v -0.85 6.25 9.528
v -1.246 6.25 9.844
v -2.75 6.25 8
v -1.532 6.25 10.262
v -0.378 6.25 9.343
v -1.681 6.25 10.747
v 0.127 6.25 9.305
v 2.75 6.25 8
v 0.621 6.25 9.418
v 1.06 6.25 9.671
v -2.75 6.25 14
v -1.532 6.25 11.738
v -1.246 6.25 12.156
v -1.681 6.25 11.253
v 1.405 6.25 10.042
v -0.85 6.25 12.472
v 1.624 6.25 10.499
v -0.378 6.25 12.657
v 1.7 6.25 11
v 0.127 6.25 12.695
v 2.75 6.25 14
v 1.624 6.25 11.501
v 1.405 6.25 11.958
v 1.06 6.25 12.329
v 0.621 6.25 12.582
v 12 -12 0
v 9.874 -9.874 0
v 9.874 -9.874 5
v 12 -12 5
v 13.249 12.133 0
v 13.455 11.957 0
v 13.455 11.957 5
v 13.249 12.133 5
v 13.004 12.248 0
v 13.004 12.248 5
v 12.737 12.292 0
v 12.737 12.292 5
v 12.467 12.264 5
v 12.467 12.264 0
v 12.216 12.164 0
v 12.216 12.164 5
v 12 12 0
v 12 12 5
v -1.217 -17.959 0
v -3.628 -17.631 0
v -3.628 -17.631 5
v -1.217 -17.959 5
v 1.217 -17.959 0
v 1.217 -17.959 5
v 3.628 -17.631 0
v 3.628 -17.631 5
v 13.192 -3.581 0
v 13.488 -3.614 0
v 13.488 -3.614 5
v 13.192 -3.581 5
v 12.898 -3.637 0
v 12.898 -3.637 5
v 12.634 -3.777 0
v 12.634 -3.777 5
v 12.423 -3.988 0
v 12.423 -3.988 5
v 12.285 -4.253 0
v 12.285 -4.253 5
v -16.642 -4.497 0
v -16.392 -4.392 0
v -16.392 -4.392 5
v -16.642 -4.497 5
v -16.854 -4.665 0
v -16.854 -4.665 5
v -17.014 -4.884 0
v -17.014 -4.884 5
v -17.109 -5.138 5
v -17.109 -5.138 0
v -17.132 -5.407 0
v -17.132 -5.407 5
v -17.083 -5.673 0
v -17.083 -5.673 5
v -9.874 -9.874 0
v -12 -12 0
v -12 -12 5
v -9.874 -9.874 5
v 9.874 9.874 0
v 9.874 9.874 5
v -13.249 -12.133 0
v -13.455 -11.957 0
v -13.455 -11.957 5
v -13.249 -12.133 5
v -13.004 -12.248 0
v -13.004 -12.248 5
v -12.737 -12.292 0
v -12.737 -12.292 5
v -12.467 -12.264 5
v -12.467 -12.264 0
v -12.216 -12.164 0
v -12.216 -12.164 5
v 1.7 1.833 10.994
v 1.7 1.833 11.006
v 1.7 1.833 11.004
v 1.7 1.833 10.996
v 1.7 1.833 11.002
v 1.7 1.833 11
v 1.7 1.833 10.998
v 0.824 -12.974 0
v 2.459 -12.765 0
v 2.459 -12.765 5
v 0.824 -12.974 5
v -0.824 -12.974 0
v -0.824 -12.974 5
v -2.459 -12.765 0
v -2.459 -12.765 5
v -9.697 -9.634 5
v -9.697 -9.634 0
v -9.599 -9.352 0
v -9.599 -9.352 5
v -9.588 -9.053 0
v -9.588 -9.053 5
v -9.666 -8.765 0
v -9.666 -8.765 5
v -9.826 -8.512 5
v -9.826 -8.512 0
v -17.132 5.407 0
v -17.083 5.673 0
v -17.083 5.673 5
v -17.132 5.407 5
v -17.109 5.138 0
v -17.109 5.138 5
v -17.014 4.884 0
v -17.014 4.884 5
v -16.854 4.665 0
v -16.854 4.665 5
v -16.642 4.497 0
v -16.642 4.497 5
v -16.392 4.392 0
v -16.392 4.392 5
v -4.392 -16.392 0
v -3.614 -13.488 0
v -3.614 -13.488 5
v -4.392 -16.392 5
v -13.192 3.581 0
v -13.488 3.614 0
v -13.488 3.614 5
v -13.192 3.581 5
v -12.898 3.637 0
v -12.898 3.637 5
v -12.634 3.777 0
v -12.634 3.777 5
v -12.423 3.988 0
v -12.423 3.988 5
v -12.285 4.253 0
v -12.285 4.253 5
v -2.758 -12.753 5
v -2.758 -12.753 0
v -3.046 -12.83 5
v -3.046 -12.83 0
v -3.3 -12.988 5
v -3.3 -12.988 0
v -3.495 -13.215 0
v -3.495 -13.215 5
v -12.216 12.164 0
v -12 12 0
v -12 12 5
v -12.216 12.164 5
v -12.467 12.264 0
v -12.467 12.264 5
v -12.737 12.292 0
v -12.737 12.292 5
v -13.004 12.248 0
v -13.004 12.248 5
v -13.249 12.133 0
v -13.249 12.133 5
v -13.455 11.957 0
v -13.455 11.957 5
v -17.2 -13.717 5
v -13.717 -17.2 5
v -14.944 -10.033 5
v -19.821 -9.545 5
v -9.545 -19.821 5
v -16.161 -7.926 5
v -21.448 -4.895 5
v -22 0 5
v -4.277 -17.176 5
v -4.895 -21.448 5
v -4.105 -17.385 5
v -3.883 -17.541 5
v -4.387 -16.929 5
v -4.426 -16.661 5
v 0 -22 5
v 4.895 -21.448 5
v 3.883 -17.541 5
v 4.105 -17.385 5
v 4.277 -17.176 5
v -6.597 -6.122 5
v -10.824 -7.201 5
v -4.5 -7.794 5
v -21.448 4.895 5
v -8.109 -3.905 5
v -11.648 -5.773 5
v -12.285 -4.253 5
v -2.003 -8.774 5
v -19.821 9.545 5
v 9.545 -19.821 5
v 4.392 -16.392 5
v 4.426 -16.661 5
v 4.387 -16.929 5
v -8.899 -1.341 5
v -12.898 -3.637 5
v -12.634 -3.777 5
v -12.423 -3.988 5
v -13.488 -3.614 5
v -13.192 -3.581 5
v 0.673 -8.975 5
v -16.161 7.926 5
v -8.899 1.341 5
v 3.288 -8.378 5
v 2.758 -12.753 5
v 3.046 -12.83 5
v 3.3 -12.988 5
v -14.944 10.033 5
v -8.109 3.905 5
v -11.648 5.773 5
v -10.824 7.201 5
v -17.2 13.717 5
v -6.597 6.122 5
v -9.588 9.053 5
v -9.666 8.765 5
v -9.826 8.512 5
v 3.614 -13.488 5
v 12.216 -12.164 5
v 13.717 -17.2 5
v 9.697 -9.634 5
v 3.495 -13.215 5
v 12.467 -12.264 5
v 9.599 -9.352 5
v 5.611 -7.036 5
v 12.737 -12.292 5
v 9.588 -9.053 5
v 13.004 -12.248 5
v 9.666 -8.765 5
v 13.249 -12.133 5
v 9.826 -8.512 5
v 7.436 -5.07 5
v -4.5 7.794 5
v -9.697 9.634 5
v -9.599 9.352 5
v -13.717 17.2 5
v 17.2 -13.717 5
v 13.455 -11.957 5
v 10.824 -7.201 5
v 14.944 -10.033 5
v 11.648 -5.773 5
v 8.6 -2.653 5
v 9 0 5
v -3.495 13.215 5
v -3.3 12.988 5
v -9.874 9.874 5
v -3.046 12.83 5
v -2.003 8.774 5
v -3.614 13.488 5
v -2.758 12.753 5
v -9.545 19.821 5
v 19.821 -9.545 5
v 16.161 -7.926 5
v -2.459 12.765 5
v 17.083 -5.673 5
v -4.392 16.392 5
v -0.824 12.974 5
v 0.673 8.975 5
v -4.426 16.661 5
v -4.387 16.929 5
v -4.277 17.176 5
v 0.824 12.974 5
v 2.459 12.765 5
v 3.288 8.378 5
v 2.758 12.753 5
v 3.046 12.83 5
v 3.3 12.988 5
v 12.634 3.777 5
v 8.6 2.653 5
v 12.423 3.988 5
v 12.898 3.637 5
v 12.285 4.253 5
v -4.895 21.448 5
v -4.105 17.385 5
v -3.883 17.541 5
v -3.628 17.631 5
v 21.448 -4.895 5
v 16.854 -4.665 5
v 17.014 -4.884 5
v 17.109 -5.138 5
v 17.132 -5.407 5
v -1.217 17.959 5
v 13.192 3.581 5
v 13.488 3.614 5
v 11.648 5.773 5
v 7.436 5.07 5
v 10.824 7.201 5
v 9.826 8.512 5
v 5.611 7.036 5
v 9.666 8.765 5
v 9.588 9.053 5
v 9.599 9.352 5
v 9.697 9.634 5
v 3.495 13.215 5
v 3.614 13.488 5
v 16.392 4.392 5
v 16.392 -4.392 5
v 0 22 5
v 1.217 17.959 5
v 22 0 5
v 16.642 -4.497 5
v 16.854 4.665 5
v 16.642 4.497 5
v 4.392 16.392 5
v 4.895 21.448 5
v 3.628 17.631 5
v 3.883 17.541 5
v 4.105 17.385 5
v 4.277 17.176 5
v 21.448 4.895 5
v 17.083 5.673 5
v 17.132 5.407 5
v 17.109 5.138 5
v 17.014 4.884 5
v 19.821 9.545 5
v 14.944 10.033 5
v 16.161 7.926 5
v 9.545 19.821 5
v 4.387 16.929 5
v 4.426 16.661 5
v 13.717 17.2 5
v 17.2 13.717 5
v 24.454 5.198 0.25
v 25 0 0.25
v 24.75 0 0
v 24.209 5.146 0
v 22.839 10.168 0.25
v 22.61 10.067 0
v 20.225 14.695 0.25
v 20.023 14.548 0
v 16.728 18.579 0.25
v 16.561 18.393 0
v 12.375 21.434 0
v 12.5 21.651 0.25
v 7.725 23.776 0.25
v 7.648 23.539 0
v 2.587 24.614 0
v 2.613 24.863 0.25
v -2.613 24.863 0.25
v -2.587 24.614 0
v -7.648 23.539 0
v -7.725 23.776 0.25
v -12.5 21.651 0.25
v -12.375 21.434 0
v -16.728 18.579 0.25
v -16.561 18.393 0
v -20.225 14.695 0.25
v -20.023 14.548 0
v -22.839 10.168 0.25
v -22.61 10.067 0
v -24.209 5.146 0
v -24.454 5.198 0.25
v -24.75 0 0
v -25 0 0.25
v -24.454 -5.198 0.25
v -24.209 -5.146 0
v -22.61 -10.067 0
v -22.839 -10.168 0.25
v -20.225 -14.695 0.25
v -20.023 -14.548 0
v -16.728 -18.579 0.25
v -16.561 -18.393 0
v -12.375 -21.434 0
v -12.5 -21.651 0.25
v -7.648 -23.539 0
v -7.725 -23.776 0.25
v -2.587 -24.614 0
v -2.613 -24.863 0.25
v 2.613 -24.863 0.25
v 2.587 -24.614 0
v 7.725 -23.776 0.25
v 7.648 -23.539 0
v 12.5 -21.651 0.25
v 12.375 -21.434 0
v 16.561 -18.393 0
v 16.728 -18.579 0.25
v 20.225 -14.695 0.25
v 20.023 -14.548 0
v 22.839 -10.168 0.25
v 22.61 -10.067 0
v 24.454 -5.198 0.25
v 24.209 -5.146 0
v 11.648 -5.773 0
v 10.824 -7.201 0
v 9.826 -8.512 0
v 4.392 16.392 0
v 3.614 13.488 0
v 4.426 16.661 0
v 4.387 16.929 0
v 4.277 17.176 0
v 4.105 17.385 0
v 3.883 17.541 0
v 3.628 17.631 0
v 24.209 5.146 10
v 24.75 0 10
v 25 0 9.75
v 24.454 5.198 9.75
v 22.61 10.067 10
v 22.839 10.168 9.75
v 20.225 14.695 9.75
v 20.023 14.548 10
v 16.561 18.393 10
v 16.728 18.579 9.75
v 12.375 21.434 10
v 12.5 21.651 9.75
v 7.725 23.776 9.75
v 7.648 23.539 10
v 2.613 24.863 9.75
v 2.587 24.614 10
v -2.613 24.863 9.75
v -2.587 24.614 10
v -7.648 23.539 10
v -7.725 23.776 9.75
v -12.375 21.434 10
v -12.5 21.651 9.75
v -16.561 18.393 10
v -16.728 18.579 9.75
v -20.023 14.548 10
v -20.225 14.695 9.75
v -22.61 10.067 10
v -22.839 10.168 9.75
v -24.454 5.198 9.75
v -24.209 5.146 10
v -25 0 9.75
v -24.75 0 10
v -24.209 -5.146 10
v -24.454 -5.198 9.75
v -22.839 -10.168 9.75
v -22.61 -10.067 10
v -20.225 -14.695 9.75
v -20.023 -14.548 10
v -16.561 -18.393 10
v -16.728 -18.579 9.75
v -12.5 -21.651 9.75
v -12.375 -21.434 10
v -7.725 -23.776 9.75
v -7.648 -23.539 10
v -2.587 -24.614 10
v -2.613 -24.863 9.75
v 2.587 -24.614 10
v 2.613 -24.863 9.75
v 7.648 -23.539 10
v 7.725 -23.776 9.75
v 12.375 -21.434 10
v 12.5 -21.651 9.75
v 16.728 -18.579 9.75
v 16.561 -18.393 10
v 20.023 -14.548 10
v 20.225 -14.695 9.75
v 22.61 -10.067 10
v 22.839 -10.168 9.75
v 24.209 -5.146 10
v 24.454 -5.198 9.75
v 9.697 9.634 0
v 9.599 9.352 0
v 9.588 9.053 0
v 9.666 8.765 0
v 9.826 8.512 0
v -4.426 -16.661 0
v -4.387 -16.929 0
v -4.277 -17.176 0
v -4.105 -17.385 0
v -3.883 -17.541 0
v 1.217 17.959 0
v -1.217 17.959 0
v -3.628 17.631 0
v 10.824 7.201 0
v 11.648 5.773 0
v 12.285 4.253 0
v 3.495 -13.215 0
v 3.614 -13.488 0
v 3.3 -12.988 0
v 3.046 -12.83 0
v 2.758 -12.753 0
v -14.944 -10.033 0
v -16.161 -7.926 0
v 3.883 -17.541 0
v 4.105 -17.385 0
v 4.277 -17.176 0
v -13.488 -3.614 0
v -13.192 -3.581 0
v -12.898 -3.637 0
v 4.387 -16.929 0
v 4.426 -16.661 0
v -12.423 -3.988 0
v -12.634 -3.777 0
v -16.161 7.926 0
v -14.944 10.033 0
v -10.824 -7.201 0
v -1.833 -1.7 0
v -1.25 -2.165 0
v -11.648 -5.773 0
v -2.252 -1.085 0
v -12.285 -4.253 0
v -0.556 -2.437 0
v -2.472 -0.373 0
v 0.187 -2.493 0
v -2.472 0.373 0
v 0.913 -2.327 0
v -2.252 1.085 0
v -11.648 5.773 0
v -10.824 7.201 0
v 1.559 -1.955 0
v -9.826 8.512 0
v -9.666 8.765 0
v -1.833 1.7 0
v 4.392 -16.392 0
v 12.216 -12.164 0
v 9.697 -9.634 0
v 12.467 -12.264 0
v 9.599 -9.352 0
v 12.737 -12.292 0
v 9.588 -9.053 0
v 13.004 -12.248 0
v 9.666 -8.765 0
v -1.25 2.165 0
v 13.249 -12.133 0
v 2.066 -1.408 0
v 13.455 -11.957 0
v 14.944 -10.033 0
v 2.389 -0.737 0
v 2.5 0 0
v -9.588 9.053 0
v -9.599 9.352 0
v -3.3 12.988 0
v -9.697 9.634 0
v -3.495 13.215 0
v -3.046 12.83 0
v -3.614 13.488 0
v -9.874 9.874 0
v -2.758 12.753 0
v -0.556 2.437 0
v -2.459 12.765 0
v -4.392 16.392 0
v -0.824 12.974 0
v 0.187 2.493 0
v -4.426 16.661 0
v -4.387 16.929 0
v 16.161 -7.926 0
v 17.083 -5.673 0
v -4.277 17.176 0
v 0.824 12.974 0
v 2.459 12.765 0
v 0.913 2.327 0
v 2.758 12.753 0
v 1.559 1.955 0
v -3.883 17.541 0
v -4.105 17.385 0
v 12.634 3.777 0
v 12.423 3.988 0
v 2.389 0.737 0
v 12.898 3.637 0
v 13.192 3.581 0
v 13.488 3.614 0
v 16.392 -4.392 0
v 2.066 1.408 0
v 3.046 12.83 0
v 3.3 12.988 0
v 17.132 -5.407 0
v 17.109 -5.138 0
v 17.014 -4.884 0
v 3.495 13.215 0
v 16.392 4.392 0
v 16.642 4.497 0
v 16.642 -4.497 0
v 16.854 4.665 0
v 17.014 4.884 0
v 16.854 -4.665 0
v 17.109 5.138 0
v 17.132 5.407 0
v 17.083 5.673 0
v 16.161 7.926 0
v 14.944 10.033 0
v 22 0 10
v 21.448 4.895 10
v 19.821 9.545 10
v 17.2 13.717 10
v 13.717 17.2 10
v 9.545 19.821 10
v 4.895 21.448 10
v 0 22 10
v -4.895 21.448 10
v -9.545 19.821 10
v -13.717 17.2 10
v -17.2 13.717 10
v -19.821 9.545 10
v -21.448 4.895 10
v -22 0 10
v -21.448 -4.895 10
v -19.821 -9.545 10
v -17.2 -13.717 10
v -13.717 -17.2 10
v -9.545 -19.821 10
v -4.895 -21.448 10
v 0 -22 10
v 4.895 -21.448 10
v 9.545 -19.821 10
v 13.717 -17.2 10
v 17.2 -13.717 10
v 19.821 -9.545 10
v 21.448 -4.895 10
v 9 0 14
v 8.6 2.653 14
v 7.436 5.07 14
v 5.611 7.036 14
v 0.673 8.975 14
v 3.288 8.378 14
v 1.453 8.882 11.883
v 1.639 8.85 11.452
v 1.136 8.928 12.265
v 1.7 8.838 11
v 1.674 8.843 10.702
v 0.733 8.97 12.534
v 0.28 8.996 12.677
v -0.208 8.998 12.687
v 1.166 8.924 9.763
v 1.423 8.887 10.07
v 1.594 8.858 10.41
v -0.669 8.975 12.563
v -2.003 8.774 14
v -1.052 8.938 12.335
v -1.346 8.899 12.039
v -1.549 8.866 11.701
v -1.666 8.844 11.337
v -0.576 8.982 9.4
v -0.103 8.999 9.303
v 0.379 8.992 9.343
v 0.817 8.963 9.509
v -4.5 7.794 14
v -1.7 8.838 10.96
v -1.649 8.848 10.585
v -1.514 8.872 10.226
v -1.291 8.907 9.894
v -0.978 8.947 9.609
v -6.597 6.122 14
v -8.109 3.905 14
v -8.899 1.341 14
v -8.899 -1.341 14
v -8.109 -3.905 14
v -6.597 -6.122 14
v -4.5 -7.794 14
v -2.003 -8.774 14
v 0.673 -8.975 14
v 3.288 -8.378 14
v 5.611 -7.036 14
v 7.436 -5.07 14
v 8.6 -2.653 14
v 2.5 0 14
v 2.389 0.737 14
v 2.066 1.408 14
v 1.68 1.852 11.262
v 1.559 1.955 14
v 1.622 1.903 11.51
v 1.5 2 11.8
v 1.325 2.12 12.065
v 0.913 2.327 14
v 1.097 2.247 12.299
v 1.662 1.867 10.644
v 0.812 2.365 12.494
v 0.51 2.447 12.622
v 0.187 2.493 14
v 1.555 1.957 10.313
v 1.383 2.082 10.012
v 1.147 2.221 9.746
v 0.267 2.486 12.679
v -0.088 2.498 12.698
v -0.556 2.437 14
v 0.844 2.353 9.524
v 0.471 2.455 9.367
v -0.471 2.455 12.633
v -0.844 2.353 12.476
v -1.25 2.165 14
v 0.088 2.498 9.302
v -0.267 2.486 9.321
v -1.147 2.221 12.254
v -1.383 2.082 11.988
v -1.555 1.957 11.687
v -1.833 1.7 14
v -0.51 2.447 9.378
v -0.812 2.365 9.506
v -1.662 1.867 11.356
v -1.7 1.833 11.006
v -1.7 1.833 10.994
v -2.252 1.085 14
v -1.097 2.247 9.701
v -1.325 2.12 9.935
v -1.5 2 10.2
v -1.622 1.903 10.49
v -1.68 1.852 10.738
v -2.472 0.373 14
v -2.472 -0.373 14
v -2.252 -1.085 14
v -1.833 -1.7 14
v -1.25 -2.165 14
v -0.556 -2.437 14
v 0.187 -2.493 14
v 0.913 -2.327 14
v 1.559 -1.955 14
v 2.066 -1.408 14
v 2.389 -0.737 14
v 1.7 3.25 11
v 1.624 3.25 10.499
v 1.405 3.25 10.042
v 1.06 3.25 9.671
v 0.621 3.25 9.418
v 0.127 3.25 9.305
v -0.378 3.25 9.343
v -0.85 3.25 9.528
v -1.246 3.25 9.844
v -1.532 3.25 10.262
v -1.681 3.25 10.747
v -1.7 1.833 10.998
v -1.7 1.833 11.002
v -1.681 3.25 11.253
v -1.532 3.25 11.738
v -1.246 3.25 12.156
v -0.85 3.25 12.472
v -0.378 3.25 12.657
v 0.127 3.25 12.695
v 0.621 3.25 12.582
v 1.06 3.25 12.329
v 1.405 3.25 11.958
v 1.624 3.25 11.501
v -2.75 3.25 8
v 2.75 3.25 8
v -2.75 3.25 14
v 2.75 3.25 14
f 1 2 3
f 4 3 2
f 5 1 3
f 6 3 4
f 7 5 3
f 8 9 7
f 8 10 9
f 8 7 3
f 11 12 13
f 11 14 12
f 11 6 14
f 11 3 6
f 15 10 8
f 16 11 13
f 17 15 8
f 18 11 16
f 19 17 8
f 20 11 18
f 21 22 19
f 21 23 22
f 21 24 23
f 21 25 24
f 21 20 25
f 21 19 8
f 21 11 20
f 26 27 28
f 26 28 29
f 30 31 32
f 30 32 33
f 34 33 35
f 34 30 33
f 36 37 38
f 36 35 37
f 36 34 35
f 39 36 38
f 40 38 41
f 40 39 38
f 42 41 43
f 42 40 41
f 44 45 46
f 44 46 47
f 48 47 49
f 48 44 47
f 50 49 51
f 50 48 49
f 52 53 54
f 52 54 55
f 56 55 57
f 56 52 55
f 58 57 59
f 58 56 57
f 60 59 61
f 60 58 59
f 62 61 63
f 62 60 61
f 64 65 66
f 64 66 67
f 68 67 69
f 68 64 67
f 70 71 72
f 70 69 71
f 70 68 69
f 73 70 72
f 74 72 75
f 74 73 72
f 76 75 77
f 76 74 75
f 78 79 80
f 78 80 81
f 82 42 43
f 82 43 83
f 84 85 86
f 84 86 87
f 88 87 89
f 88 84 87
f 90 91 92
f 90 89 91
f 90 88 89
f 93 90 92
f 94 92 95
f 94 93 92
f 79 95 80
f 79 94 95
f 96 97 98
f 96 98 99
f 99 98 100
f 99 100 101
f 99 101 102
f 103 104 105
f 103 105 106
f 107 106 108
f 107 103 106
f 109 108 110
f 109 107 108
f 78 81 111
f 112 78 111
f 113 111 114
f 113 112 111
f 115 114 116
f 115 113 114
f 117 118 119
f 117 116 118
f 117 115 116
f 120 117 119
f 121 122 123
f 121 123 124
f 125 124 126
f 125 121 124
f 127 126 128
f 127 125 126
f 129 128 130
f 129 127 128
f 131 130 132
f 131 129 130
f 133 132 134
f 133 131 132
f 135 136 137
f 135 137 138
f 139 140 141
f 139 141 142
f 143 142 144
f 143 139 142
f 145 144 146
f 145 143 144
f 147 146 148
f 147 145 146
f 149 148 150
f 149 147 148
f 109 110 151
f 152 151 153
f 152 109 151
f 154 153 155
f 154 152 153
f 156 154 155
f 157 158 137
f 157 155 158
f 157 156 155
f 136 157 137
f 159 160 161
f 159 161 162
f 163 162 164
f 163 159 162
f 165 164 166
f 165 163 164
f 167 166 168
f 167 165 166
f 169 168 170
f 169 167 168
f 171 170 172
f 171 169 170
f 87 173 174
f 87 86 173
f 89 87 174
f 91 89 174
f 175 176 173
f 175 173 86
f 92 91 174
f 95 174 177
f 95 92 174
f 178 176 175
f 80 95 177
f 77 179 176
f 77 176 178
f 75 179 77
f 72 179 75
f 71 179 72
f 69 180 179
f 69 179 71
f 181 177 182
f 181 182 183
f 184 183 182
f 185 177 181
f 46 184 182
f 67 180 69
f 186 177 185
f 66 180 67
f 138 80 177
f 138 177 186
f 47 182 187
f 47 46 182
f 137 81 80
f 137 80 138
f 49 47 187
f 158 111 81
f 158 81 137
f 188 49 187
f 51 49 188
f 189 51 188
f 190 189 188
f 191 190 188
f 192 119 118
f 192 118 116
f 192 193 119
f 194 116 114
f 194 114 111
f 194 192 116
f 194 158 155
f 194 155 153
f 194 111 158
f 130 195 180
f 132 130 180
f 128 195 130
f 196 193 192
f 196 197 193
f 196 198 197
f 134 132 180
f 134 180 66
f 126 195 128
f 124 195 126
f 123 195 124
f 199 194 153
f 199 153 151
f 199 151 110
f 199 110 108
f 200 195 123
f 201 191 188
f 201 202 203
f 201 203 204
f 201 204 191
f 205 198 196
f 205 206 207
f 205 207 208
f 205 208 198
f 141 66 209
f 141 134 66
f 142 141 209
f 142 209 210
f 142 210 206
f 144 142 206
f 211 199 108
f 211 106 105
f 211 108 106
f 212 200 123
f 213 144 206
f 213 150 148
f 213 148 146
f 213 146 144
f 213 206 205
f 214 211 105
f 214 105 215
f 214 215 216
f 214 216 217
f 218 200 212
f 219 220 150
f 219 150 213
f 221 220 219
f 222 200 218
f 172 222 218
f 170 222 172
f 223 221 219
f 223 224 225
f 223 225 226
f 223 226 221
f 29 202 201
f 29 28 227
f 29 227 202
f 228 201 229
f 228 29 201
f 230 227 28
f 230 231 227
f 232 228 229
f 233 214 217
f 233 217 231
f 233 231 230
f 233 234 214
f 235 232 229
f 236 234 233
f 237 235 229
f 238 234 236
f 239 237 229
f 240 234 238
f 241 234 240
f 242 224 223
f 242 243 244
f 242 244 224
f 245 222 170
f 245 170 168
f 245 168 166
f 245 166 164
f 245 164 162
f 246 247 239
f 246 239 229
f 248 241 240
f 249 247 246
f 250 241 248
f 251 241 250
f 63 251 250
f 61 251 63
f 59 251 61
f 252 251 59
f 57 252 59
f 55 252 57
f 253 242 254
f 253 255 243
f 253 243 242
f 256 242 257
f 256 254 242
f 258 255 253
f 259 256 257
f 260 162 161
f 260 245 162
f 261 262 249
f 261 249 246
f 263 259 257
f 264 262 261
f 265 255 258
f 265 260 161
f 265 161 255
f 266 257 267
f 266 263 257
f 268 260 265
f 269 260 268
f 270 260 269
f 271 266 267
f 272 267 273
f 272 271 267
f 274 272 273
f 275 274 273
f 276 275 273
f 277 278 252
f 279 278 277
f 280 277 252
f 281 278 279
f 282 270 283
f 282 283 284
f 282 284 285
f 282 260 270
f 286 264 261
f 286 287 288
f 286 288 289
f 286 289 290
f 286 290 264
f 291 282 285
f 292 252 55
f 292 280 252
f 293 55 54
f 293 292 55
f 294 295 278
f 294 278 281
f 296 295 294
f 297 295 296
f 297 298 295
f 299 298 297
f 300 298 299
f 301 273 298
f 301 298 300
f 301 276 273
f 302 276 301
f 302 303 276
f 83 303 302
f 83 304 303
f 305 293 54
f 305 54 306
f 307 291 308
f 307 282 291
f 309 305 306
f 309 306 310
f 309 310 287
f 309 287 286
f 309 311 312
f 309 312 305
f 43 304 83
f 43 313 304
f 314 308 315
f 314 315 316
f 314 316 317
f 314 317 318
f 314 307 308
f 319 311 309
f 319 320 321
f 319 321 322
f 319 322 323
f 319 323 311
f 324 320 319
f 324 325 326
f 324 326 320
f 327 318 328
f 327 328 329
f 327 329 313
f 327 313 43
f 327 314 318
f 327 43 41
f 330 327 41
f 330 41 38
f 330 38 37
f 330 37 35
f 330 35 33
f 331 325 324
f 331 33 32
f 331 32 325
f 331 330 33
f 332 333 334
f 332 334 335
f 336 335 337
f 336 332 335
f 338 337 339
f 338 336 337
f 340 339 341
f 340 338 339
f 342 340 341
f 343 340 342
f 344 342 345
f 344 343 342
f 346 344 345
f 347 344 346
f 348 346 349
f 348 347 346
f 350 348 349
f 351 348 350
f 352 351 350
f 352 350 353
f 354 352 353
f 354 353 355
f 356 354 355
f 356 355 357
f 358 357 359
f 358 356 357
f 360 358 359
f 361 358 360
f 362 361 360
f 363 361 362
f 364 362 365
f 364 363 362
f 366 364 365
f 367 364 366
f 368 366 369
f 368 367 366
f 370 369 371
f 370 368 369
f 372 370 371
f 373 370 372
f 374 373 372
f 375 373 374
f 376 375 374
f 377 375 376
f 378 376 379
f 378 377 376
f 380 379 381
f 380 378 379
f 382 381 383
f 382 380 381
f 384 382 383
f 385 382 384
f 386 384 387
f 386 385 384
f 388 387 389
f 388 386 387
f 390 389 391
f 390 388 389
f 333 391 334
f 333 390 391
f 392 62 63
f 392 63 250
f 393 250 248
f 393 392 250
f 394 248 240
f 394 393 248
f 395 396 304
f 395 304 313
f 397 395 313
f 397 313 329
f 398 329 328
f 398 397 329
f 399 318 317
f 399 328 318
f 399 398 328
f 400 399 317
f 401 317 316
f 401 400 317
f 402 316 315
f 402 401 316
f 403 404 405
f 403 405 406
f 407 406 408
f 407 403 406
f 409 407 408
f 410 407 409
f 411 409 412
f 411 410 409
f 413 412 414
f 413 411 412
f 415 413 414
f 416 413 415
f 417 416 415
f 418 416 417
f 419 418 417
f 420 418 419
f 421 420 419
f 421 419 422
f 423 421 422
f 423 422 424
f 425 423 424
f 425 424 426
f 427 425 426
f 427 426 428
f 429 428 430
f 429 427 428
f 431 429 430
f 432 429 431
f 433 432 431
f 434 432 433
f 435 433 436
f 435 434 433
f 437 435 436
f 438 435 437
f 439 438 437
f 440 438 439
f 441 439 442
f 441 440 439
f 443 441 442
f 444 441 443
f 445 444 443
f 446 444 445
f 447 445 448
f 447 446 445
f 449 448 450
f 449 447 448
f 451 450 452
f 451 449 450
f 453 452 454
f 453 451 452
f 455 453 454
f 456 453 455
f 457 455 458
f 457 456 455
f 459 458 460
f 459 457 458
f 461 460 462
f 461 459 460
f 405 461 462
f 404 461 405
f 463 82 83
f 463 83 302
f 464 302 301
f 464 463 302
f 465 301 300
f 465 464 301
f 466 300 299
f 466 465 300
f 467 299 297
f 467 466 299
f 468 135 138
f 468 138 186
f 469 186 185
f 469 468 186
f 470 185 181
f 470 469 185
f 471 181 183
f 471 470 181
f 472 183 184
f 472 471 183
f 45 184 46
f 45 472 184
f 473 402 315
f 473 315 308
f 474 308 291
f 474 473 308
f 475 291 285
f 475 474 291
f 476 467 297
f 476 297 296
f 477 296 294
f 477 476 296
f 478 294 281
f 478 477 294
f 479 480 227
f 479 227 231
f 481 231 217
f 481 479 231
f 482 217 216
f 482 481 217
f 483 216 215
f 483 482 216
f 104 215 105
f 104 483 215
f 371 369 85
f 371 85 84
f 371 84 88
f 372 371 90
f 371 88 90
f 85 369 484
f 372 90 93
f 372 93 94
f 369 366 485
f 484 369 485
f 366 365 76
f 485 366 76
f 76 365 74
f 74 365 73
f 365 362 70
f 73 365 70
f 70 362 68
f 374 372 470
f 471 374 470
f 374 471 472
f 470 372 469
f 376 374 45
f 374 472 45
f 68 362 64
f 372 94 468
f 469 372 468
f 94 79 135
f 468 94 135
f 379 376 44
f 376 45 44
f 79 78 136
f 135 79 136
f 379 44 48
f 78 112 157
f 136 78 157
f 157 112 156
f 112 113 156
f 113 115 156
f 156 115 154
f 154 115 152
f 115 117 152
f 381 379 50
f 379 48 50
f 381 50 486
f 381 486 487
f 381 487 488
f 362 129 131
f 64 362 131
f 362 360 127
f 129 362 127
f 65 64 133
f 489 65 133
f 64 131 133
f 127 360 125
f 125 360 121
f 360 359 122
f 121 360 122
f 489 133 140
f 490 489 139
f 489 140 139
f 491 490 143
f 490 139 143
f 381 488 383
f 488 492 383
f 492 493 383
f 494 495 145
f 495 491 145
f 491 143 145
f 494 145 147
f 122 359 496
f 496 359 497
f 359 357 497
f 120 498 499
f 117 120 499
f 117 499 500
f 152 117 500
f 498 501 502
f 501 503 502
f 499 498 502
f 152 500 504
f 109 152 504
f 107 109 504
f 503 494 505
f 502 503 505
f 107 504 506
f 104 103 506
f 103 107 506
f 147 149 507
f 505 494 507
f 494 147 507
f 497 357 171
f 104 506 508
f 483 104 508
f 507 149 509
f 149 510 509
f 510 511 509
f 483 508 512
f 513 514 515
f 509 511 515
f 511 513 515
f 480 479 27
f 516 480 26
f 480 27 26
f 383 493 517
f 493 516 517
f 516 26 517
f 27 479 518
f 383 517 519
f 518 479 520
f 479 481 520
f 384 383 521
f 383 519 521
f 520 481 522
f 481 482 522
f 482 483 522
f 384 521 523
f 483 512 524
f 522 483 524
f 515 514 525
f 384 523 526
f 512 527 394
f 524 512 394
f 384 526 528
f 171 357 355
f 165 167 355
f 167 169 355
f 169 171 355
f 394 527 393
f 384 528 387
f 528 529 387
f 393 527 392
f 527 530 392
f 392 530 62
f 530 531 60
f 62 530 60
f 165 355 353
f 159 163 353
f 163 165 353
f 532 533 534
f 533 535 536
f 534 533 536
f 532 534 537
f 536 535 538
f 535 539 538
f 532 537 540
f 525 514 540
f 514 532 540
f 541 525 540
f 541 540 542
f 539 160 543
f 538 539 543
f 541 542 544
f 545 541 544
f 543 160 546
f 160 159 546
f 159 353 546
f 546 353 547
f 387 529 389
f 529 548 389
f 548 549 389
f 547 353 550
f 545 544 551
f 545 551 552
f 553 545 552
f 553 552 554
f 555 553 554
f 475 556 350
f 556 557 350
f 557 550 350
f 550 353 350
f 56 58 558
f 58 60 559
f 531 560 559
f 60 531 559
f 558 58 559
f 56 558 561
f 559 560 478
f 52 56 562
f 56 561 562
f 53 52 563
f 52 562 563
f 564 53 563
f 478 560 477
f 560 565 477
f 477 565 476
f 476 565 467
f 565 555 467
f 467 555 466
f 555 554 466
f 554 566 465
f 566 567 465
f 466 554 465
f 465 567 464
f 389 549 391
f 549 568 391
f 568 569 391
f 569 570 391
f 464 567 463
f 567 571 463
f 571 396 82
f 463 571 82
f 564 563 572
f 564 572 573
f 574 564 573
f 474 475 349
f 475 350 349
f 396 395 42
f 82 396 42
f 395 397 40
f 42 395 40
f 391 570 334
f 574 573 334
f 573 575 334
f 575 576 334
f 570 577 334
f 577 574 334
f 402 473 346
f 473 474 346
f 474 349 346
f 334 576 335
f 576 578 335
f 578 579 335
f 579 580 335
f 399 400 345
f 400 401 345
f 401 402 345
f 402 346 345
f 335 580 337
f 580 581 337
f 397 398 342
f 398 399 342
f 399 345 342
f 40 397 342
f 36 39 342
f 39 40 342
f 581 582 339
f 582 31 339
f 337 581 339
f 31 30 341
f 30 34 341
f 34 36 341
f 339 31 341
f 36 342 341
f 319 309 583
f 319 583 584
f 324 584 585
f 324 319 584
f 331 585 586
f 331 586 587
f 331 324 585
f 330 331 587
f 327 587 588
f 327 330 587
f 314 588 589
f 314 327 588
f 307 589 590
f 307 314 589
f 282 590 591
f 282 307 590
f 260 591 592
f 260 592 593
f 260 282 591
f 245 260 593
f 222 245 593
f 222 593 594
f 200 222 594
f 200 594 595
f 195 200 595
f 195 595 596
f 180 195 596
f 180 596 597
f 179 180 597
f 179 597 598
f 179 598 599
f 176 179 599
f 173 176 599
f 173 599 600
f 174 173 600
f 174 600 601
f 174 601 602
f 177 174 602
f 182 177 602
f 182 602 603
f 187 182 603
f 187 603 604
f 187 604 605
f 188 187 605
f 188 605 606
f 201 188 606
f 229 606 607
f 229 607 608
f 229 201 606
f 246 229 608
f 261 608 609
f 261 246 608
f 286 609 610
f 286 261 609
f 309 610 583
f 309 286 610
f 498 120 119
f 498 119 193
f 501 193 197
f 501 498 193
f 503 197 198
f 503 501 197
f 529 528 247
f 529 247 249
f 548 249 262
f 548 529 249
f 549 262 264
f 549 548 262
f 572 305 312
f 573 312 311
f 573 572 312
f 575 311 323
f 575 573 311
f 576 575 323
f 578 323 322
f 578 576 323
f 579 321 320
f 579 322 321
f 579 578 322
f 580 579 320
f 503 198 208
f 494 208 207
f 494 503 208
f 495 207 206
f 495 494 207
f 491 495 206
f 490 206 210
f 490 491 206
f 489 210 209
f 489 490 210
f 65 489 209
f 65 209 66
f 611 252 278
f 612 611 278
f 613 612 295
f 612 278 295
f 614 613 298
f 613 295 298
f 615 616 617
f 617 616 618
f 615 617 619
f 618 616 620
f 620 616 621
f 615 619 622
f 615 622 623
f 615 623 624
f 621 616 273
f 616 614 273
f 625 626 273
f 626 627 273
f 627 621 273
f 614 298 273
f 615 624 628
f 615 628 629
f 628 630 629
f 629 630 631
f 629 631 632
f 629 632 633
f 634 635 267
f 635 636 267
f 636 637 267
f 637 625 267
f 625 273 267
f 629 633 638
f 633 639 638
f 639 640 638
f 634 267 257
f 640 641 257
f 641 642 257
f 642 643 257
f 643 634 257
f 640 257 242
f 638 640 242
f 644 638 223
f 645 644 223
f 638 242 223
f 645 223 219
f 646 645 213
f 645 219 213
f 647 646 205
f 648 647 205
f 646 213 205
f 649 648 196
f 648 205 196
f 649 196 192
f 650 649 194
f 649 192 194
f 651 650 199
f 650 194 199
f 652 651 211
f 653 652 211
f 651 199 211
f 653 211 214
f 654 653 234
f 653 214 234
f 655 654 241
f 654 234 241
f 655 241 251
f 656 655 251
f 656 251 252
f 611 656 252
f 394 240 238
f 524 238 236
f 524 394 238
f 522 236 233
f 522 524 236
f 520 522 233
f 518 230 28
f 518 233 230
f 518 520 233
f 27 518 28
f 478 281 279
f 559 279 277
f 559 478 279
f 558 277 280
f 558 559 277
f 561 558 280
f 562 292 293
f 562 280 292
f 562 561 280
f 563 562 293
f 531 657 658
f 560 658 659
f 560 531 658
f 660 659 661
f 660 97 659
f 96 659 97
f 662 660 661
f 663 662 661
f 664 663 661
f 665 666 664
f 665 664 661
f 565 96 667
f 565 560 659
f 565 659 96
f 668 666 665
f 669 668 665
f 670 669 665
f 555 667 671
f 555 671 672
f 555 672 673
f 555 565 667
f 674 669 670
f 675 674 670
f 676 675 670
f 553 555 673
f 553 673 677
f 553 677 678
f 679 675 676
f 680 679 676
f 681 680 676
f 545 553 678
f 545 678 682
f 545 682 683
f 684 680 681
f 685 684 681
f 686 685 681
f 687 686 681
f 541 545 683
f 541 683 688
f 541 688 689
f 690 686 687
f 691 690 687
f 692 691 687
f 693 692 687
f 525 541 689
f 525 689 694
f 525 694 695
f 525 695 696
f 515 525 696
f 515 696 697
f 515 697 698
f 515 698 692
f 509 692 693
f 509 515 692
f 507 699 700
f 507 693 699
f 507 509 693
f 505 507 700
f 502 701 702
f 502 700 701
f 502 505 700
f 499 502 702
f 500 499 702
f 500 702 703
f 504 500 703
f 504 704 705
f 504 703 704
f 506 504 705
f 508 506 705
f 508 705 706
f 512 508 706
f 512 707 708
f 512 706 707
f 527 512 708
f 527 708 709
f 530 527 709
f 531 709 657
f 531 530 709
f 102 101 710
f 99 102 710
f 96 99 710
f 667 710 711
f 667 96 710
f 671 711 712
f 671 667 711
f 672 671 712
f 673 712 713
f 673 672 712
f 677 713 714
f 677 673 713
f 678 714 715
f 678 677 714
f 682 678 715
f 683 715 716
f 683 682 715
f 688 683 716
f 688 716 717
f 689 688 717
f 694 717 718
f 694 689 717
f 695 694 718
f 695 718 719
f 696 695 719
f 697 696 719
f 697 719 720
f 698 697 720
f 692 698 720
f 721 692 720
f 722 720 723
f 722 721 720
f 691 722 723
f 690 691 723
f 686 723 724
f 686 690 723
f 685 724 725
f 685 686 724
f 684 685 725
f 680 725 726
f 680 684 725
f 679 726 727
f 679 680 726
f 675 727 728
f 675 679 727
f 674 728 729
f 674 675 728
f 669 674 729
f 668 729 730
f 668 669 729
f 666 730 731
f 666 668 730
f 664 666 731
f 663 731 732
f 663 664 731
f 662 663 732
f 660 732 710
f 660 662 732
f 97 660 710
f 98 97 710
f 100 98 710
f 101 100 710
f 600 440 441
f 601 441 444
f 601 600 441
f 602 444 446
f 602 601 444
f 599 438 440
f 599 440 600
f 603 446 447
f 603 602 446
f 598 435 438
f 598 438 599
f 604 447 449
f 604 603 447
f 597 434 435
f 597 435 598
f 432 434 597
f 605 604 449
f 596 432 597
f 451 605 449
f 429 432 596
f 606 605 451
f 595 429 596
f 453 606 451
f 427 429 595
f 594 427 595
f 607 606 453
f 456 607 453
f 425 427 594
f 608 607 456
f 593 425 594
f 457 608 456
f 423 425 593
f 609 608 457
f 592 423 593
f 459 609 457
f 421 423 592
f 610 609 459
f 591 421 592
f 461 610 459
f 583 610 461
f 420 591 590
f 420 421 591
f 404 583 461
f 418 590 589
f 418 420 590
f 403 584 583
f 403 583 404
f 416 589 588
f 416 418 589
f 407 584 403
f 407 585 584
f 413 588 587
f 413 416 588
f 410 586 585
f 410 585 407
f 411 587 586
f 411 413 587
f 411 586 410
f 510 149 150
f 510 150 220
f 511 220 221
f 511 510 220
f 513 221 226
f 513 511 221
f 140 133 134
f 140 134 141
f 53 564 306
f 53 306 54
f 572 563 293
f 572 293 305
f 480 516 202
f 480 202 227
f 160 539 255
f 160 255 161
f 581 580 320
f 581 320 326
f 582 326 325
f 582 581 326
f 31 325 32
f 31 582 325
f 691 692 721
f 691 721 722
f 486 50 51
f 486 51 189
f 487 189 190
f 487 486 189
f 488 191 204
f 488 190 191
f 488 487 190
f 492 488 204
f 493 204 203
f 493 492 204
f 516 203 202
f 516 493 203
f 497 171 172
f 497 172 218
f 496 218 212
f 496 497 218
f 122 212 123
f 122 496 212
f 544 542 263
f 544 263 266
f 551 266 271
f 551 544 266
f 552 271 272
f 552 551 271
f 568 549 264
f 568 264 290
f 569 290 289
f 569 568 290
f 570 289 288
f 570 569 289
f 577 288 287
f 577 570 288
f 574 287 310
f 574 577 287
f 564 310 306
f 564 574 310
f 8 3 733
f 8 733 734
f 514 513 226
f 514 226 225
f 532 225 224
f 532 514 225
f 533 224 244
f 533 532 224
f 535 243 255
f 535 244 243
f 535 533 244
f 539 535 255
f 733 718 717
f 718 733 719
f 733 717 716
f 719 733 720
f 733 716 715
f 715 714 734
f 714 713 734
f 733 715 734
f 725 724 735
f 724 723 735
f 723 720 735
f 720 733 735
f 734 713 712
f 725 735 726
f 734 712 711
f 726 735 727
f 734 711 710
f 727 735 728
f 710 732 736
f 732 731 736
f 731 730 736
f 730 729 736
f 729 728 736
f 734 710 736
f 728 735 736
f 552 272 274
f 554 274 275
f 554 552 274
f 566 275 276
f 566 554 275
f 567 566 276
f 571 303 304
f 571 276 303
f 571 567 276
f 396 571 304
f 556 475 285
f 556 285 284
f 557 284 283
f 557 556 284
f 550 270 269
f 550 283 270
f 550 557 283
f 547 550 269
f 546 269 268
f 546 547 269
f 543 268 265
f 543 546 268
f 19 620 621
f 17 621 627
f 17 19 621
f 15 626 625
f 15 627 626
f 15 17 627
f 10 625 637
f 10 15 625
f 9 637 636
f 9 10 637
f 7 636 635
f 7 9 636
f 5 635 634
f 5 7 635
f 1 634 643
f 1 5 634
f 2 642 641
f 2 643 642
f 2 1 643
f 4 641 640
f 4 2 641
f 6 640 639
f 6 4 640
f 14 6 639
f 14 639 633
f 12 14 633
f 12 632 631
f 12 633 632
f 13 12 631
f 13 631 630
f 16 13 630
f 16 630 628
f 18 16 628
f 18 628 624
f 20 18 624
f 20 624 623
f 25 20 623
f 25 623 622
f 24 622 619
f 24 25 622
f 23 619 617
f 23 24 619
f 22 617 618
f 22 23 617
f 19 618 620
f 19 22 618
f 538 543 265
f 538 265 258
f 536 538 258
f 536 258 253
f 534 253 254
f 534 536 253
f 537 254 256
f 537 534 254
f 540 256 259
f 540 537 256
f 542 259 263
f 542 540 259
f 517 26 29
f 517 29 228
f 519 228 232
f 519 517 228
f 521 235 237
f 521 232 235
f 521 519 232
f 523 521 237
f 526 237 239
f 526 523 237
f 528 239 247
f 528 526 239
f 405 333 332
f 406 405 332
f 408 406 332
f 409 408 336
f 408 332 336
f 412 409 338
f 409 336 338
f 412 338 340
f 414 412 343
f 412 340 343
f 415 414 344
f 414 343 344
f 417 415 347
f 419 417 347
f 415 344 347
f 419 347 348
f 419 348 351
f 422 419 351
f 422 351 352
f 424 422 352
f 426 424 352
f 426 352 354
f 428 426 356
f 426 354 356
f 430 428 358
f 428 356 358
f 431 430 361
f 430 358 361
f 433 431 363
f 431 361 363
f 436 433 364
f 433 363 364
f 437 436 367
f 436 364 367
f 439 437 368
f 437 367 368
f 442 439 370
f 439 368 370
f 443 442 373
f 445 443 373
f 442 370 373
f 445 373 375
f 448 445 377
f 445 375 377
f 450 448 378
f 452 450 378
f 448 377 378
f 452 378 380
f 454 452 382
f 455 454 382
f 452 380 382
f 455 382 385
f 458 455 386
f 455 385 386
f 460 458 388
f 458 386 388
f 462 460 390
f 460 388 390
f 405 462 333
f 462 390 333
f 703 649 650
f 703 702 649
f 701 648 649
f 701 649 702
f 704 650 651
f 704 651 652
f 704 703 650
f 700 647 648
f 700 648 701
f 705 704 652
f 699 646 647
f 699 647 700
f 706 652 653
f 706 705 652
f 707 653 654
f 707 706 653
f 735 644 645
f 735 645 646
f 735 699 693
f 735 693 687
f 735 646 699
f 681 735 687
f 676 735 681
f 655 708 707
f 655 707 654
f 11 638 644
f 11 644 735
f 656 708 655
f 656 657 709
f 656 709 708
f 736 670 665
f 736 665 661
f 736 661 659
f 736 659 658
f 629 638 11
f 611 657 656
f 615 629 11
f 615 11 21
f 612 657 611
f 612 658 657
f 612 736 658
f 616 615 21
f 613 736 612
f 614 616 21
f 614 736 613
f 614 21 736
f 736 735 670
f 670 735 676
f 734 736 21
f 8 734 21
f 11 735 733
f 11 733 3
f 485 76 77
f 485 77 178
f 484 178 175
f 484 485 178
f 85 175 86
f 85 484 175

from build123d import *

# Parameters (mm, degrees)
SKETCH1_R           = 25
BOSS_EXTRUDE1_DEPTH = 5
SKETCH3_R           = 25
SKETCH3_R_2         = 22
BOSS_EXTRUDE3_DEPTH = 10
SKETCH4_R           = 9
BOSS_EXTRUDE4_DEPTH = 14
SKETCH5_R           = 2.5
CUT_EXTRUDE1_DEPTH  = 15
SKETCH6_W           = 5.5
SKETCH6_H           = 3
CUT_EXTRUDE2_DEPTH  = 6
CUT_EXTRUDE3_START  = 1.83304
SKETCH7_R           = 1.7
CUT_EXTRUDE3_DEPTH  = 7.16696
CUT_EXTRUDE4_DEPTH  = 15.0000001
CIRPATTERN1_COUNT   = 6
CHAMFER1_SIZE       = 0.25


with BuildPart() as part:
    # Sketch1 → Boss-Extrude1 (new body)
    with BuildSketch(Plane.XY):
        Circle(SKETCH1_R)
    extrude(amount=BOSS_EXTRUDE1_DEPTH)

    # Sketch3 → Boss-Extrude3 (add)
    with BuildSketch(Plane.XY):
        Circle(SKETCH3_R)
        Circle(SKETCH3_R_2, mode=Mode.SUBTRACT)
    extrude(amount=BOSS_EXTRUDE3_DEPTH)

    # Sketch4 → Boss-Extrude4 (add)
    with BuildSketch(Plane.XY):
        Circle(SKETCH4_R)
    extrude(amount=BOSS_EXTRUDE4_DEPTH)

    # Sketch5 → Cut-Extrude1 (cut, through all)
    with BuildSketch(Plane.XY):
        Circle(SKETCH5_R)
    extrude(amount=CUT_EXTRUDE1_DEPTH, mode=Mode.SUBTRACT)

    # Sketch6 → Cut-Extrude2 (cut)
    with BuildSketch(Plane.XY.offset(14)):
        with Locations((0, 4.75)):
            Rectangle(SKETCH6_W, SKETCH6_H)
    extrude(amount=-CUT_EXTRUDE2_DEPTH, mode=Mode.SUBTRACT)

    # Sketch7 → Cut-Extrude3 (cut)
    with BuildSketch(Plane(origin=(0, 0, 0), x_dir=(1, 0, 0), z_dir=(0, 1, 0)).offset(CUT_EXTRUDE3_START)):
        with Locations((0, -11)):
            Circle(SKETCH7_R)
    extrude(amount=CUT_EXTRUDE3_DEPTH, mode=Mode.SUBTRACT)

    # Sketch8 → Cut-Extrude4 (cut, through all)
    with BuildSketch(Plane.XY):
        with BuildLine():
            Line((-4.392304845, 16.392304845), (-3.614211274, 13.488420103))
            ThreePointArc((-3.614211274, 13.488420103), (-3.178915308, 12.899635496), (-2.459122201, 12.765293494))
            ThreePointArc((-2.459122201, 12.765293494), (0, 13), (2.459122201, 12.765293494))
            ThreePointArc((2.459122201, 12.765293494), (3.178915308, 12.899635496), (3.614211274, 13.488420103))
            Line((3.614211274, 13.488420103), (4.392304845, 16.392304845))
            ThreePointArc((4.392304845, 16.392304845), (4.277317186, 17.176389762), (3.627930726, 17.630601766))
            ThreePointArc((3.627930726, 17.630601766), (0, 18), (-3.627930726, 17.630601766))
            ThreePointArc((-3.627930726, 17.630601766), (-4.277317186, 17.176389762), (-4.392304845, 16.392304845))
        make_face()
    cut_extrude4 = extrude(amount=CUT_EXTRUDE4_DEPTH, mode=Mode.SUBTRACT)

    # CirPattern1: Cut-Extrude4 ×6 about axis
    cirpattern1_axis = Axis((0, 0, 0), (0, 0, 1))
    for i in range(1, CIRPATTERN1_COUNT):
        add(cut_extrude4.rotate(cirpattern1_axis, i * 360 / CIRPATTERN1_COUNT), mode=Mode.SUBTRACT)

    # Chamfer1
    chamfer1_edges = [part.edges().sort_by_distance(p)[0] for p in [
        (-25, 0, 0),
        (-25, 0, 10),
    ]]
    chamfer(chamfer1_edges, length=CHAMFER1_SIZE)


solid = part.part
